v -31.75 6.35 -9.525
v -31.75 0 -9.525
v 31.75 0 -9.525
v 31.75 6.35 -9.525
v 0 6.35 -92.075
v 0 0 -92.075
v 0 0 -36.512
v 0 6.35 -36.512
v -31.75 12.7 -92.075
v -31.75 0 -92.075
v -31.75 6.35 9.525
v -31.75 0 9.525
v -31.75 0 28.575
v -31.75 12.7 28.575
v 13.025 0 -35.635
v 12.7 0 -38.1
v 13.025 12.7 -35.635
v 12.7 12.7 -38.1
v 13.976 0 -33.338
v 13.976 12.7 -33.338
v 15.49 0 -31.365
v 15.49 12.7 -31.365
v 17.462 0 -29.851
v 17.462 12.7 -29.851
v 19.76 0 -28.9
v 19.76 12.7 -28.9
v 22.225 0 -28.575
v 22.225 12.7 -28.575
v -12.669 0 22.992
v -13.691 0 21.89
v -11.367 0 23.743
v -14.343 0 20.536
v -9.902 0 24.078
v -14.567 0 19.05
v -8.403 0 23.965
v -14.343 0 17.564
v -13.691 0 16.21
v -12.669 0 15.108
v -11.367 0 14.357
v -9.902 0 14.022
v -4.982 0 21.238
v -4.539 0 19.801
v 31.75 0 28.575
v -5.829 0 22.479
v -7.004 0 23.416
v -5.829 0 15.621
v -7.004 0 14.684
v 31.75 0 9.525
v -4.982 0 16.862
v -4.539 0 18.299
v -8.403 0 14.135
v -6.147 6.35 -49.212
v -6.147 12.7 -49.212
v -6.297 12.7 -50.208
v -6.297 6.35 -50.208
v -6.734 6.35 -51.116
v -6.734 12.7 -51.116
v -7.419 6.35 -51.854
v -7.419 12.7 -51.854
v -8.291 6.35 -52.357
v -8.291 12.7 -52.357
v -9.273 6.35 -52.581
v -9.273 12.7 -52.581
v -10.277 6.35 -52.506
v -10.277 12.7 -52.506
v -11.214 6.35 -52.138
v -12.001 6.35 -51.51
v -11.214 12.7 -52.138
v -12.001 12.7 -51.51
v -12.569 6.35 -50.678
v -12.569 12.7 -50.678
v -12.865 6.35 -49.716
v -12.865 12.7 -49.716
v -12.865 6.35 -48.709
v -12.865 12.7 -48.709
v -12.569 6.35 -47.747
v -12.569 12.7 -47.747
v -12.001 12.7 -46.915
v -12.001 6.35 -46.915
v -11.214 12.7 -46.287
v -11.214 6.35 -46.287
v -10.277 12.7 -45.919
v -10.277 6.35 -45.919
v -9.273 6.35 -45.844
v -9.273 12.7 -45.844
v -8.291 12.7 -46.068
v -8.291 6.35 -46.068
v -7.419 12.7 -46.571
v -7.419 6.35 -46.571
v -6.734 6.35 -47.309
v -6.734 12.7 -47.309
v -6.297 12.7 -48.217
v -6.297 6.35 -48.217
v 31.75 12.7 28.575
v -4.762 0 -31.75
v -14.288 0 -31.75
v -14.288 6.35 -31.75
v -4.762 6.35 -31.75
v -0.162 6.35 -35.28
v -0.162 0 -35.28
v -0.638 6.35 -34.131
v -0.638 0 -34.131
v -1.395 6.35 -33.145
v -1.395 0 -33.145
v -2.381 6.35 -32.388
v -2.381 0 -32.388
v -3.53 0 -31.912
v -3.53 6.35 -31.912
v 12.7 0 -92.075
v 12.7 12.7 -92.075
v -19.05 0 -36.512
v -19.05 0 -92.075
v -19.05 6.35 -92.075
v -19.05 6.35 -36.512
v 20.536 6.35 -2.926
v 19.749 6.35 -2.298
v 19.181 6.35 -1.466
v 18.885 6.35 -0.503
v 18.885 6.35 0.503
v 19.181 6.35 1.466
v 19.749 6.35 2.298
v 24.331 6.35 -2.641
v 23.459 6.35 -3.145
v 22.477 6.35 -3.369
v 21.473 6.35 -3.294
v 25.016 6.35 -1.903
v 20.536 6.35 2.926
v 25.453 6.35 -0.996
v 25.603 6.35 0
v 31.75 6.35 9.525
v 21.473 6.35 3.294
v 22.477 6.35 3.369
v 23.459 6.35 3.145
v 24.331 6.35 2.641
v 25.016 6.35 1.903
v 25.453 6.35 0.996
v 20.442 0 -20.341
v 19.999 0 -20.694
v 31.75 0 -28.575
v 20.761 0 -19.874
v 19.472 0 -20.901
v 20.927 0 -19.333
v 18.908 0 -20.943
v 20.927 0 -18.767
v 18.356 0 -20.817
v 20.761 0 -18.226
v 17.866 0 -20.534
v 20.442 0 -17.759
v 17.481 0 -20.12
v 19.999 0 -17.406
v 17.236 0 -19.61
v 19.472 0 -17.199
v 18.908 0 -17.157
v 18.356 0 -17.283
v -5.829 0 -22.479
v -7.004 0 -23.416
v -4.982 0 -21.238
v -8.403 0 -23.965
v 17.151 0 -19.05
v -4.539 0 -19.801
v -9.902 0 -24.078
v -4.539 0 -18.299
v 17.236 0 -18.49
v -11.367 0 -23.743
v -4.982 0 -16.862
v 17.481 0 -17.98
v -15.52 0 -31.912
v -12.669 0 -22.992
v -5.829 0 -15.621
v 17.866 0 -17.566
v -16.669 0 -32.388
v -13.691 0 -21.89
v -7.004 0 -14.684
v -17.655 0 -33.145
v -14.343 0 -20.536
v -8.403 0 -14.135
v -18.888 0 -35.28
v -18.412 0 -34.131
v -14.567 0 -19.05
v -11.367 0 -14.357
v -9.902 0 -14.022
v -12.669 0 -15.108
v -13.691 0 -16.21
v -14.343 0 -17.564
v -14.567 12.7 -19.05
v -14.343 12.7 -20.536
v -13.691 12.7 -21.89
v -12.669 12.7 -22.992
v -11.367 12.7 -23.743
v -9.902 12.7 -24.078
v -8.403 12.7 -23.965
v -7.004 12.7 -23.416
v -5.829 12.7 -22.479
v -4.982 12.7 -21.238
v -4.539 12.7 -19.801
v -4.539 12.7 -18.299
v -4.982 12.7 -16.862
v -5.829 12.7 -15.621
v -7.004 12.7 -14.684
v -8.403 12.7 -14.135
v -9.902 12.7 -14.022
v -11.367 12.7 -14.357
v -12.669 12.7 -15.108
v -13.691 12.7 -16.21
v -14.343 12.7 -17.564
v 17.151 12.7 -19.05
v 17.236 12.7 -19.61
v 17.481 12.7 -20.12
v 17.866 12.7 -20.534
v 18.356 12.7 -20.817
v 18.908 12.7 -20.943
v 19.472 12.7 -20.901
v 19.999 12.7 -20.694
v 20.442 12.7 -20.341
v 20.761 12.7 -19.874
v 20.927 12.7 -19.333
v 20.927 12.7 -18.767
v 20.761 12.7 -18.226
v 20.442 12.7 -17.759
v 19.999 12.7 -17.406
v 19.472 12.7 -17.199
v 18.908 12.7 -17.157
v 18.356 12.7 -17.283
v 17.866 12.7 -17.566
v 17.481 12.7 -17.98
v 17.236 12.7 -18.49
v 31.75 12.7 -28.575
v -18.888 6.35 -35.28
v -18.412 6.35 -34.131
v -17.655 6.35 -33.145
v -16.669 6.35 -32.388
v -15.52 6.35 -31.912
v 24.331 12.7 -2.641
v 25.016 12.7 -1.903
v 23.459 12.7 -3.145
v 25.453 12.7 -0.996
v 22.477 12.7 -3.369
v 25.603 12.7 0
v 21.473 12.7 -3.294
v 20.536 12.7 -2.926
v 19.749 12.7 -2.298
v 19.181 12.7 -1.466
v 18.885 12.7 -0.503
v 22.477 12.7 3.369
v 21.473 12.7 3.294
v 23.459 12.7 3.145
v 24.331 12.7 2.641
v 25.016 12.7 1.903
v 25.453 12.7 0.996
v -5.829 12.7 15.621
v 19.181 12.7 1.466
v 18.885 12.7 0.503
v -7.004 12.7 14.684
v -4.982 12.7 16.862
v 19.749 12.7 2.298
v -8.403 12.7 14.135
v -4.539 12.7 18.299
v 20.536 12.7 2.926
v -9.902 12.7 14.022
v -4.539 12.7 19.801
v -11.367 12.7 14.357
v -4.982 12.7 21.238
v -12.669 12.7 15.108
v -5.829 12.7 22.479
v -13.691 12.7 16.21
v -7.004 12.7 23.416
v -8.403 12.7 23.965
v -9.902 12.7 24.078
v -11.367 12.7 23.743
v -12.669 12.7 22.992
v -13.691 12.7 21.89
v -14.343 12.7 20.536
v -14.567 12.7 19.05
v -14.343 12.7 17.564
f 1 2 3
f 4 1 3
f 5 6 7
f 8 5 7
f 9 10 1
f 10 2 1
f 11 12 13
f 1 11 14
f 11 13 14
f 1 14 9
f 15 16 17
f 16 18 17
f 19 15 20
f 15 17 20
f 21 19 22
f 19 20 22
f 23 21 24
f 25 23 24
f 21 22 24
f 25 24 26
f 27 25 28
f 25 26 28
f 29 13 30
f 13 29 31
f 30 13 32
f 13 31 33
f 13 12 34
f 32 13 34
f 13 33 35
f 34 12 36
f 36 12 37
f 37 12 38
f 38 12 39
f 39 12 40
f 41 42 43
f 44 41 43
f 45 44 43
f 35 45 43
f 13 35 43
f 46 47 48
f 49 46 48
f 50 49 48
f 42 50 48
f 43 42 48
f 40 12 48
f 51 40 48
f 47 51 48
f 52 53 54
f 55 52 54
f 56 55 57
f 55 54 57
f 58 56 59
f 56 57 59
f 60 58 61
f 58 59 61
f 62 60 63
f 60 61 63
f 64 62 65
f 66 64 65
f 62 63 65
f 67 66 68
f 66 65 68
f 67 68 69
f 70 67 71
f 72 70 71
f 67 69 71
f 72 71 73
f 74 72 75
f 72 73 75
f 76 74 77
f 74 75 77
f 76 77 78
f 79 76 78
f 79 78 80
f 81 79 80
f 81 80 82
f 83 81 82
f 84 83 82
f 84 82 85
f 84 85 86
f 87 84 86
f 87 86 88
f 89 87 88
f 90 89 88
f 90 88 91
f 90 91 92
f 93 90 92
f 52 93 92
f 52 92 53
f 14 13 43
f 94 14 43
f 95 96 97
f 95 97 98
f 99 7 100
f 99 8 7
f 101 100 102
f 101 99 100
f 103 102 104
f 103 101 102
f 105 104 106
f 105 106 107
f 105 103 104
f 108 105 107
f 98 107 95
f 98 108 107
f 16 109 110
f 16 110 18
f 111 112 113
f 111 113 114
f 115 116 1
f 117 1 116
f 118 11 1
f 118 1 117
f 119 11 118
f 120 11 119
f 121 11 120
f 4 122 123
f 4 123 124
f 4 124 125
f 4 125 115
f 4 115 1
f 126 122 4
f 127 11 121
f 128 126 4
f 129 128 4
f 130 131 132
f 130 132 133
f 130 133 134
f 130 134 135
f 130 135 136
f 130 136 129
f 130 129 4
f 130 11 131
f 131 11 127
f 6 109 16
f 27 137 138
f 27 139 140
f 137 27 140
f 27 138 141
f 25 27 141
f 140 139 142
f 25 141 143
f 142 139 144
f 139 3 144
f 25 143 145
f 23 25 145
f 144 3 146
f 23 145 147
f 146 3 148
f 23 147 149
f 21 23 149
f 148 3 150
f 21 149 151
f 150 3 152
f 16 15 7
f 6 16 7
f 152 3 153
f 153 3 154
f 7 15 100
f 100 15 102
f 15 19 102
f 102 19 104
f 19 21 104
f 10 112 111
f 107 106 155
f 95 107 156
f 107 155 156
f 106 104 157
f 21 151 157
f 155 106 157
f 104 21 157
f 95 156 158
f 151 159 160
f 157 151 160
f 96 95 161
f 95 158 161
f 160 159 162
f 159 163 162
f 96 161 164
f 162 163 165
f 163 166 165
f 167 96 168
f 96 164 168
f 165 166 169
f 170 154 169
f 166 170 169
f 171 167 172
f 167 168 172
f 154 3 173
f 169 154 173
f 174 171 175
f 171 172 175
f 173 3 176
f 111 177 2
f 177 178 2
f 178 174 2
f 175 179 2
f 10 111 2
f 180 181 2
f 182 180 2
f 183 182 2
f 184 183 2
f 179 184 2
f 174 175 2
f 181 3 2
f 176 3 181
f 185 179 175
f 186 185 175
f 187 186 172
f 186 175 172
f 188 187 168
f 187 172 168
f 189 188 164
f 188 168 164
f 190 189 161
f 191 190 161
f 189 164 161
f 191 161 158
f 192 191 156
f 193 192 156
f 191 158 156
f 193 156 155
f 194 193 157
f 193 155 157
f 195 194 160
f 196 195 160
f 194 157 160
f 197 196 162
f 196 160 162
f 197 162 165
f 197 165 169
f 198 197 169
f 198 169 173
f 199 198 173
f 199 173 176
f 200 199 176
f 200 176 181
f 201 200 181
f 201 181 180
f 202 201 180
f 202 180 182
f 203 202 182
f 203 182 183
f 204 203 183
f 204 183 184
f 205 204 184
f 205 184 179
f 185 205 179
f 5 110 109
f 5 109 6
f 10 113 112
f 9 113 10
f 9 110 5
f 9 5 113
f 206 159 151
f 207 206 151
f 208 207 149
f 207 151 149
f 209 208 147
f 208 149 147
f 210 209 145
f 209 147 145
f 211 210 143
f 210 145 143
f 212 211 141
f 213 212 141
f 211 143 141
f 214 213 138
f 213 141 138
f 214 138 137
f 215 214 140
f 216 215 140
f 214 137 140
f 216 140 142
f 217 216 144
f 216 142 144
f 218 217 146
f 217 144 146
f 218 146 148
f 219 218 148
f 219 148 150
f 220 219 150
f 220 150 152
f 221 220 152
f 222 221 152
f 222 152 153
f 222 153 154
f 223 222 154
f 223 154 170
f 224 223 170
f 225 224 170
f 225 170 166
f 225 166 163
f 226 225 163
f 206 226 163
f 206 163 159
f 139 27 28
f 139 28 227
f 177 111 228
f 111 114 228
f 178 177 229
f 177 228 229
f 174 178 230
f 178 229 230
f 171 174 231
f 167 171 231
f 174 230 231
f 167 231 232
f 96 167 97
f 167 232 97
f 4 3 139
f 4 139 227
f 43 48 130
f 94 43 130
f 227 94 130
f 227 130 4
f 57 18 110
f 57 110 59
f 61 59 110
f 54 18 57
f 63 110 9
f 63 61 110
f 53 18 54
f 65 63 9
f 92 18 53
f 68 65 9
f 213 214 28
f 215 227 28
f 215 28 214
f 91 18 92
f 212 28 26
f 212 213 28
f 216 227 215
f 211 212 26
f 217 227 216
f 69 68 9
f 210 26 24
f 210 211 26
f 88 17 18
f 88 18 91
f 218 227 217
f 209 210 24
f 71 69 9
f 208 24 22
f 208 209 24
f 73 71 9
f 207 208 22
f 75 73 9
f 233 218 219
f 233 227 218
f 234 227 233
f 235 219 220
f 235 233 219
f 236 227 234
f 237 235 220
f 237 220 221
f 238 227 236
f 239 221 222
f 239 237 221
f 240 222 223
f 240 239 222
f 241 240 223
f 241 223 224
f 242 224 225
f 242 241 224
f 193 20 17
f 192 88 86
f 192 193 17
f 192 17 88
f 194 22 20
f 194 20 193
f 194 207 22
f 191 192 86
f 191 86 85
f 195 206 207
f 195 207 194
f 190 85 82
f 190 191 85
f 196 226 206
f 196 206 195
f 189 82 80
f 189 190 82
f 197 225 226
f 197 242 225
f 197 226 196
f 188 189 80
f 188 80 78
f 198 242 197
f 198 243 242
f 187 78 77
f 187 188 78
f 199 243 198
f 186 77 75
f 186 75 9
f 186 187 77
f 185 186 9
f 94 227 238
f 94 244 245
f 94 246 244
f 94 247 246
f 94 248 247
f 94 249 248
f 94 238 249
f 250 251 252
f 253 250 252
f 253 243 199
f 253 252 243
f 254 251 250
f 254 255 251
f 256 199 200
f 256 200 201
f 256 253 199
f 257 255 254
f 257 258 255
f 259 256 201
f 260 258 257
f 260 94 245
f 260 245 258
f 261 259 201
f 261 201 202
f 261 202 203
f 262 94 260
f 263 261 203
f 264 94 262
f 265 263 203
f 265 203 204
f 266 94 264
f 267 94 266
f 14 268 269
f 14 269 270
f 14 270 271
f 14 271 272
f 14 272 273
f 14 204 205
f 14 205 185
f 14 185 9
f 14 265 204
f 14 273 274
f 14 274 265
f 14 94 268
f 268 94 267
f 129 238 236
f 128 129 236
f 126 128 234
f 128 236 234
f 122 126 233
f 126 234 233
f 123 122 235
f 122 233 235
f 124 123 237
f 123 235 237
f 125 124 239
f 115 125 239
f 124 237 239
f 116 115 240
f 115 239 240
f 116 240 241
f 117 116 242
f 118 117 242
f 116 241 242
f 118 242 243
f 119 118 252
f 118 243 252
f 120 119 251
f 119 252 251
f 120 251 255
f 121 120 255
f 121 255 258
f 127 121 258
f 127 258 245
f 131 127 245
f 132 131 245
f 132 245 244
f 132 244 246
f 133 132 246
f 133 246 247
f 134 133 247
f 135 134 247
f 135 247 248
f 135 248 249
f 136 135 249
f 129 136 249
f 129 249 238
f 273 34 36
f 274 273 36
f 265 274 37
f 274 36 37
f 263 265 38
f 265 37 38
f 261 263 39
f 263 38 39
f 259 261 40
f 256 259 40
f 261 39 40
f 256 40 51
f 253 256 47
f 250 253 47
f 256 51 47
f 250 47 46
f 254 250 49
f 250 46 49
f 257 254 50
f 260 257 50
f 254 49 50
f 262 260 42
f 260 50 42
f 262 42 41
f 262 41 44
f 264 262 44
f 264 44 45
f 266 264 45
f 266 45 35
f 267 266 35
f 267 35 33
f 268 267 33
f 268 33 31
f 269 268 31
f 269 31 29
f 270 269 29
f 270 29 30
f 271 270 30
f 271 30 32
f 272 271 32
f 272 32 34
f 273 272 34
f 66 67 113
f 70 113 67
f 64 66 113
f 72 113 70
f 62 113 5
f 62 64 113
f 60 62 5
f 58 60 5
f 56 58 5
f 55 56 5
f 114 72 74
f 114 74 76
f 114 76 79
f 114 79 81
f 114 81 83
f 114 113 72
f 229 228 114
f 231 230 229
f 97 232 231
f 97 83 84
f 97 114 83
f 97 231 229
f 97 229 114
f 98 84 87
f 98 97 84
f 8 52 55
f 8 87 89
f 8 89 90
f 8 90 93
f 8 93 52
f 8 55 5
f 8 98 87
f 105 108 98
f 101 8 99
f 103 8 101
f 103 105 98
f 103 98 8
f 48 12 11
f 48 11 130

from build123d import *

# Parameters (mm, degrees)
SKETCH1_W               = 63.5
SKETCH1_H               = 57.15
BOSS_EXTRUDE1_DEPTH     = 12.7
SKETCH2_W               = 63.5
SKETCH2_H               = 19.05
CUT_EXTRUDE1_DEPTH      = 6.35
F_3_8_CLEARANCE_HOLE1_D = 10.0838
SKETCH10_W              = 63.5
SKETCH10_H              = 12.7
BOSS_EXTRUDE2_DEPTH     = 63.5
SKETCH11_W              = 19.05
SKETCH11_H              = 60.325
CUT_EXTRUDE3_DEPTH      = 6.35
FILLET1_R               = 4.7625
F_1_4_CLEARANCE_HOLE1_D = 6.7564
SKETCH13_W              = 19.05
SKETCH13_H              = 63.5
CUT_EXTRUDE5_DEPTH      = 99.219947694
FILLET2_R               = 9.525
F_10_24_TAPPED_HOLE1_D  = 3.7973


with BuildPart() as part:
    # Sketch1 → Boss-Extrude1 (new body)
    with BuildSketch(Plane(origin=(0, 0, 0), x_dir=(1, 0, 0), z_dir=(0, 1, 0))):
        Rectangle(SKETCH1_W, SKETCH1_H)
    extrude(amount=BOSS_EXTRUDE1_DEPTH)

    # Sketch2 → Cut-Extrude1 (cut)
    with BuildSketch(Plane.XZ):
        Rectangle(SKETCH2_W, SKETCH2_H)
    extrude(amount=-CUT_EXTRUDE1_DEPTH, mode=Mode.SUBTRACT)

    # 3/8 Clearance Hole1 (through all)
    with Locations(Plane(origin=(0, 12.7, 0), x_dir=(1, 0, 0), z_dir=(0, 1, 0))):
        with Locations((-9.525, 19.05), (-9.525, -19.05)):
            Hole(F_3_8_CLEARANCE_HOLE1_D / 2)

    # Sketch10 → Boss-Extrude2 (add)
    with BuildSketch(Plane(origin=(0, 0, -28.575), x_dir=(-1, 0, 0), z_dir=(0, 0, -1))):
        with Locations((0, 6.35)):
            Rectangle(SKETCH10_W, SKETCH10_H)
    extrude(amount=BOSS_EXTRUDE2_DEPTH)

    # Sketch11 → Cut-Extrude3 (cut)
    with BuildSketch(Plane.XZ):
        with Locations((-9.525, -61.9125)):
            Rectangle(SKETCH11_W, SKETCH11_H)
    extrude(amount=-CUT_EXTRUDE3_DEPTH, mode=Mode.SUBTRACT)

    # Fillet1
    fillet1_edges = [part.edges().sort_by_distance(p)[0] for p in [
        (0, 3.175, -31.75),
        (-19.05, 3.175, -31.75),
    ]]
    fillet(fillet1_edges, radius=FILLET1_R)

    # 1/4 Clearance Hole1 (through all)
    with Locations(Plane(origin=(0, 6.35, 0), x_dir=(-1, 0, 0), z_dir=(0, -1, 0))):
        with Locations((-22.225, 0), (9.525, 49.2125)):
            Hole(F_1_4_CLEARANCE_HOLE1_D / 2)

    # Sketch13 → Cut-Extrude5 (cut, through all)
    with BuildSketch(Plane.XZ):
        with Locations((22.225, -60.325)):
            Rectangle(SKETCH13_W, SKETCH13_H)
    extrude(amount=-CUT_EXTRUDE5_DEPTH, mode=Mode.SUBTRACT)

    # Fillet2
    fillet2_edges = [part.edges().sort_by_distance(p)[0] for p in [
        (12.7, 6.35, -28.575),
    ]]
    fillet(fillet2_edges, radius=FILLET2_R)

    # #10-24 Tapped Hole1 (through all)
    with Locations(Plane(origin=(0, 12.7, 0), x_dir=(1, 0, 0), z_dir=(0, 1, 0))):
        with Locations((19.05, 19.05)):
            Hole(F_10_24_TAPPED_HOLE1_D / 2)


solid = part.part
